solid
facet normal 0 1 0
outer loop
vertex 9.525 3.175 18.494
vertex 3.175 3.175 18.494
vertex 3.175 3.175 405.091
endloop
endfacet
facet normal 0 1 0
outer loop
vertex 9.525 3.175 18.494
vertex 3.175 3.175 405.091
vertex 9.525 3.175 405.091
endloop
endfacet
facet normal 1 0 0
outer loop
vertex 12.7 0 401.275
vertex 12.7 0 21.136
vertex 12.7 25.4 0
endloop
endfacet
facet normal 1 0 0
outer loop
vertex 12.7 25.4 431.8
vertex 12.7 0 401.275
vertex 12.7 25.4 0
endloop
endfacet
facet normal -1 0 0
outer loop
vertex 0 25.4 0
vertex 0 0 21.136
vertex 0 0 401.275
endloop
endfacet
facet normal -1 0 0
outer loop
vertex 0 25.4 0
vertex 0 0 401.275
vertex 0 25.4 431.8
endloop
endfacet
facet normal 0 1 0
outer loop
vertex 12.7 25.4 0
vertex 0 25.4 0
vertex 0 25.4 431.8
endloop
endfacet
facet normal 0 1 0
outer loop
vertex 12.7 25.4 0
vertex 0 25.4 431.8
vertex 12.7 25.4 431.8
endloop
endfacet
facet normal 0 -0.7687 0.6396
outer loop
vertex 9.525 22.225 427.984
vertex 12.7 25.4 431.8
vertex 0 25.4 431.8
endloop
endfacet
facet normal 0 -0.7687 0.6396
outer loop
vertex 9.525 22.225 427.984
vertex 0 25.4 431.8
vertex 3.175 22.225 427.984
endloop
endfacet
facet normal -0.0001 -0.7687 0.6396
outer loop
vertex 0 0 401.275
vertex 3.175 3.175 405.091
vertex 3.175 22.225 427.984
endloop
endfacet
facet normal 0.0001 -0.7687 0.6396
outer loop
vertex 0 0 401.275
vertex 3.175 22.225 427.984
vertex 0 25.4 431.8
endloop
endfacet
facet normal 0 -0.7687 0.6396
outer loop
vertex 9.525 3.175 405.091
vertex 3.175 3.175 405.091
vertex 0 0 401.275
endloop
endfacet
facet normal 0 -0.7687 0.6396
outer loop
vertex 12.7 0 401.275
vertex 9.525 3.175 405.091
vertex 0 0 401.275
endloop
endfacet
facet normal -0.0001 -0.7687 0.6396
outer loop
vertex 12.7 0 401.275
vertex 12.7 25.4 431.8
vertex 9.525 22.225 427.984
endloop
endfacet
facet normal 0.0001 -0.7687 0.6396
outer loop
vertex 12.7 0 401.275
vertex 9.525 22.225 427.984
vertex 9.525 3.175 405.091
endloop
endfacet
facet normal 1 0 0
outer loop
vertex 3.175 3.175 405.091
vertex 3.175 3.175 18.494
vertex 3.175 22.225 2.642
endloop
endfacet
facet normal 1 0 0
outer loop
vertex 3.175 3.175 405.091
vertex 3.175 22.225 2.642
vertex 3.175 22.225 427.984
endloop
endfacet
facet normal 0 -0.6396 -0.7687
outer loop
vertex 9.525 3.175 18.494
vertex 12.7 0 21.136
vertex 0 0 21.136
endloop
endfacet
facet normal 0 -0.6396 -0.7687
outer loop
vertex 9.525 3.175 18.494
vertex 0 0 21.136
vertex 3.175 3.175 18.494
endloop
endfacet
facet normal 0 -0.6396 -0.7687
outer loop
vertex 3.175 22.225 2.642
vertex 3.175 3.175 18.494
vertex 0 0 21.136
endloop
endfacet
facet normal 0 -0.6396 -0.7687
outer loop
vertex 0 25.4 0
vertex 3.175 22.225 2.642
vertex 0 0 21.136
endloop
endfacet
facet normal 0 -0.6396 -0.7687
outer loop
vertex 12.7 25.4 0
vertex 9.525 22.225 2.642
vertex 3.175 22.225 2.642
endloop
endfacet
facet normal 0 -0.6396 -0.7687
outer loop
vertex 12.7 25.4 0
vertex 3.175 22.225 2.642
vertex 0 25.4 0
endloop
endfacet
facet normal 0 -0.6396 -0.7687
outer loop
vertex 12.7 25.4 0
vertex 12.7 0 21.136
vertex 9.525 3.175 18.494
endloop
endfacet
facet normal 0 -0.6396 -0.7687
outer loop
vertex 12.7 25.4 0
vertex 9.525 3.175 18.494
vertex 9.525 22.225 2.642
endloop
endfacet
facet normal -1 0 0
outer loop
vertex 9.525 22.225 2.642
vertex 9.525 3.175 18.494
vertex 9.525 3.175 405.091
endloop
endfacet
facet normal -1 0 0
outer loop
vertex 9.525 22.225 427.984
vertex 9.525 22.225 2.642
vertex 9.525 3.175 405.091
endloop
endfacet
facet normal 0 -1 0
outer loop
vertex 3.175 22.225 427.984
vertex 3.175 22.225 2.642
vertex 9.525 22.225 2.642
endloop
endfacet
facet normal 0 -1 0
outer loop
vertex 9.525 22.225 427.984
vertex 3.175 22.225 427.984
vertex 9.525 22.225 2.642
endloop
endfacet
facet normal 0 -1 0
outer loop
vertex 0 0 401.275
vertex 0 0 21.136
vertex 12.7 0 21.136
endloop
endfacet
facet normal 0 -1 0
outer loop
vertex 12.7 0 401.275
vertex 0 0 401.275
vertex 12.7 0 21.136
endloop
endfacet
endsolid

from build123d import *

# Parameters (mm, degrees)
SKETCH1_W           = 12.7
SKETCH1_H           = 25.4
SKETCH1_W_2         = 6.35
SKETCH1_H_2         = 19.05
BOSS_EXTRUDE1_DEPTH = 431.8
CUT_EXTRUDE1_DEPTH  = 13.7
CUT_EXTRUDE2_DEPTH  = 13.7


with BuildPart() as part:
    # Sketch1 → Boss-Extrude1 (new body)
    with BuildSketch(Plane.XY):
        with Locations((6.35, 12.7)):
            Rectangle(SKETCH1_W, SKETCH1_H)
        with Locations((6.35, 12.7)):
            Rectangle(SKETCH1_W_2, SKETCH1_H_2, mode=Mode.SUBTRACT)
    extrude(amount=BOSS_EXTRUDE1_DEPTH)

    # Sketch2 → Cut-Extrude1 (cut, through all)
    with BuildSketch(Plane(origin=(12.7, 0, 0), x_dir=(0, 0, -1), z_dir=(1, 0, 0))):
        Polygon((-431.8, 25.4), (-401.275136185, 0), (-431.8, 0), align=None)
    extrude(amount=-CUT_EXTRUDE1_DEPTH, mode=Mode.SUBTRACT)

    # Sketch3 → Cut-Extrude2 (cut, through all)
    with BuildSketch(Plane(origin=(12.7, 0, 0), x_dir=(0, 0, -1), z_dir=(1, 0, 0))):
        Polygon((-21.13555703, 0), (0, 25.4), (0, 0), align=None)
    extrude(amount=-CUT_EXTRUDE2_DEPTH, mode=Mode.SUBTRACT)


solid = part.part
